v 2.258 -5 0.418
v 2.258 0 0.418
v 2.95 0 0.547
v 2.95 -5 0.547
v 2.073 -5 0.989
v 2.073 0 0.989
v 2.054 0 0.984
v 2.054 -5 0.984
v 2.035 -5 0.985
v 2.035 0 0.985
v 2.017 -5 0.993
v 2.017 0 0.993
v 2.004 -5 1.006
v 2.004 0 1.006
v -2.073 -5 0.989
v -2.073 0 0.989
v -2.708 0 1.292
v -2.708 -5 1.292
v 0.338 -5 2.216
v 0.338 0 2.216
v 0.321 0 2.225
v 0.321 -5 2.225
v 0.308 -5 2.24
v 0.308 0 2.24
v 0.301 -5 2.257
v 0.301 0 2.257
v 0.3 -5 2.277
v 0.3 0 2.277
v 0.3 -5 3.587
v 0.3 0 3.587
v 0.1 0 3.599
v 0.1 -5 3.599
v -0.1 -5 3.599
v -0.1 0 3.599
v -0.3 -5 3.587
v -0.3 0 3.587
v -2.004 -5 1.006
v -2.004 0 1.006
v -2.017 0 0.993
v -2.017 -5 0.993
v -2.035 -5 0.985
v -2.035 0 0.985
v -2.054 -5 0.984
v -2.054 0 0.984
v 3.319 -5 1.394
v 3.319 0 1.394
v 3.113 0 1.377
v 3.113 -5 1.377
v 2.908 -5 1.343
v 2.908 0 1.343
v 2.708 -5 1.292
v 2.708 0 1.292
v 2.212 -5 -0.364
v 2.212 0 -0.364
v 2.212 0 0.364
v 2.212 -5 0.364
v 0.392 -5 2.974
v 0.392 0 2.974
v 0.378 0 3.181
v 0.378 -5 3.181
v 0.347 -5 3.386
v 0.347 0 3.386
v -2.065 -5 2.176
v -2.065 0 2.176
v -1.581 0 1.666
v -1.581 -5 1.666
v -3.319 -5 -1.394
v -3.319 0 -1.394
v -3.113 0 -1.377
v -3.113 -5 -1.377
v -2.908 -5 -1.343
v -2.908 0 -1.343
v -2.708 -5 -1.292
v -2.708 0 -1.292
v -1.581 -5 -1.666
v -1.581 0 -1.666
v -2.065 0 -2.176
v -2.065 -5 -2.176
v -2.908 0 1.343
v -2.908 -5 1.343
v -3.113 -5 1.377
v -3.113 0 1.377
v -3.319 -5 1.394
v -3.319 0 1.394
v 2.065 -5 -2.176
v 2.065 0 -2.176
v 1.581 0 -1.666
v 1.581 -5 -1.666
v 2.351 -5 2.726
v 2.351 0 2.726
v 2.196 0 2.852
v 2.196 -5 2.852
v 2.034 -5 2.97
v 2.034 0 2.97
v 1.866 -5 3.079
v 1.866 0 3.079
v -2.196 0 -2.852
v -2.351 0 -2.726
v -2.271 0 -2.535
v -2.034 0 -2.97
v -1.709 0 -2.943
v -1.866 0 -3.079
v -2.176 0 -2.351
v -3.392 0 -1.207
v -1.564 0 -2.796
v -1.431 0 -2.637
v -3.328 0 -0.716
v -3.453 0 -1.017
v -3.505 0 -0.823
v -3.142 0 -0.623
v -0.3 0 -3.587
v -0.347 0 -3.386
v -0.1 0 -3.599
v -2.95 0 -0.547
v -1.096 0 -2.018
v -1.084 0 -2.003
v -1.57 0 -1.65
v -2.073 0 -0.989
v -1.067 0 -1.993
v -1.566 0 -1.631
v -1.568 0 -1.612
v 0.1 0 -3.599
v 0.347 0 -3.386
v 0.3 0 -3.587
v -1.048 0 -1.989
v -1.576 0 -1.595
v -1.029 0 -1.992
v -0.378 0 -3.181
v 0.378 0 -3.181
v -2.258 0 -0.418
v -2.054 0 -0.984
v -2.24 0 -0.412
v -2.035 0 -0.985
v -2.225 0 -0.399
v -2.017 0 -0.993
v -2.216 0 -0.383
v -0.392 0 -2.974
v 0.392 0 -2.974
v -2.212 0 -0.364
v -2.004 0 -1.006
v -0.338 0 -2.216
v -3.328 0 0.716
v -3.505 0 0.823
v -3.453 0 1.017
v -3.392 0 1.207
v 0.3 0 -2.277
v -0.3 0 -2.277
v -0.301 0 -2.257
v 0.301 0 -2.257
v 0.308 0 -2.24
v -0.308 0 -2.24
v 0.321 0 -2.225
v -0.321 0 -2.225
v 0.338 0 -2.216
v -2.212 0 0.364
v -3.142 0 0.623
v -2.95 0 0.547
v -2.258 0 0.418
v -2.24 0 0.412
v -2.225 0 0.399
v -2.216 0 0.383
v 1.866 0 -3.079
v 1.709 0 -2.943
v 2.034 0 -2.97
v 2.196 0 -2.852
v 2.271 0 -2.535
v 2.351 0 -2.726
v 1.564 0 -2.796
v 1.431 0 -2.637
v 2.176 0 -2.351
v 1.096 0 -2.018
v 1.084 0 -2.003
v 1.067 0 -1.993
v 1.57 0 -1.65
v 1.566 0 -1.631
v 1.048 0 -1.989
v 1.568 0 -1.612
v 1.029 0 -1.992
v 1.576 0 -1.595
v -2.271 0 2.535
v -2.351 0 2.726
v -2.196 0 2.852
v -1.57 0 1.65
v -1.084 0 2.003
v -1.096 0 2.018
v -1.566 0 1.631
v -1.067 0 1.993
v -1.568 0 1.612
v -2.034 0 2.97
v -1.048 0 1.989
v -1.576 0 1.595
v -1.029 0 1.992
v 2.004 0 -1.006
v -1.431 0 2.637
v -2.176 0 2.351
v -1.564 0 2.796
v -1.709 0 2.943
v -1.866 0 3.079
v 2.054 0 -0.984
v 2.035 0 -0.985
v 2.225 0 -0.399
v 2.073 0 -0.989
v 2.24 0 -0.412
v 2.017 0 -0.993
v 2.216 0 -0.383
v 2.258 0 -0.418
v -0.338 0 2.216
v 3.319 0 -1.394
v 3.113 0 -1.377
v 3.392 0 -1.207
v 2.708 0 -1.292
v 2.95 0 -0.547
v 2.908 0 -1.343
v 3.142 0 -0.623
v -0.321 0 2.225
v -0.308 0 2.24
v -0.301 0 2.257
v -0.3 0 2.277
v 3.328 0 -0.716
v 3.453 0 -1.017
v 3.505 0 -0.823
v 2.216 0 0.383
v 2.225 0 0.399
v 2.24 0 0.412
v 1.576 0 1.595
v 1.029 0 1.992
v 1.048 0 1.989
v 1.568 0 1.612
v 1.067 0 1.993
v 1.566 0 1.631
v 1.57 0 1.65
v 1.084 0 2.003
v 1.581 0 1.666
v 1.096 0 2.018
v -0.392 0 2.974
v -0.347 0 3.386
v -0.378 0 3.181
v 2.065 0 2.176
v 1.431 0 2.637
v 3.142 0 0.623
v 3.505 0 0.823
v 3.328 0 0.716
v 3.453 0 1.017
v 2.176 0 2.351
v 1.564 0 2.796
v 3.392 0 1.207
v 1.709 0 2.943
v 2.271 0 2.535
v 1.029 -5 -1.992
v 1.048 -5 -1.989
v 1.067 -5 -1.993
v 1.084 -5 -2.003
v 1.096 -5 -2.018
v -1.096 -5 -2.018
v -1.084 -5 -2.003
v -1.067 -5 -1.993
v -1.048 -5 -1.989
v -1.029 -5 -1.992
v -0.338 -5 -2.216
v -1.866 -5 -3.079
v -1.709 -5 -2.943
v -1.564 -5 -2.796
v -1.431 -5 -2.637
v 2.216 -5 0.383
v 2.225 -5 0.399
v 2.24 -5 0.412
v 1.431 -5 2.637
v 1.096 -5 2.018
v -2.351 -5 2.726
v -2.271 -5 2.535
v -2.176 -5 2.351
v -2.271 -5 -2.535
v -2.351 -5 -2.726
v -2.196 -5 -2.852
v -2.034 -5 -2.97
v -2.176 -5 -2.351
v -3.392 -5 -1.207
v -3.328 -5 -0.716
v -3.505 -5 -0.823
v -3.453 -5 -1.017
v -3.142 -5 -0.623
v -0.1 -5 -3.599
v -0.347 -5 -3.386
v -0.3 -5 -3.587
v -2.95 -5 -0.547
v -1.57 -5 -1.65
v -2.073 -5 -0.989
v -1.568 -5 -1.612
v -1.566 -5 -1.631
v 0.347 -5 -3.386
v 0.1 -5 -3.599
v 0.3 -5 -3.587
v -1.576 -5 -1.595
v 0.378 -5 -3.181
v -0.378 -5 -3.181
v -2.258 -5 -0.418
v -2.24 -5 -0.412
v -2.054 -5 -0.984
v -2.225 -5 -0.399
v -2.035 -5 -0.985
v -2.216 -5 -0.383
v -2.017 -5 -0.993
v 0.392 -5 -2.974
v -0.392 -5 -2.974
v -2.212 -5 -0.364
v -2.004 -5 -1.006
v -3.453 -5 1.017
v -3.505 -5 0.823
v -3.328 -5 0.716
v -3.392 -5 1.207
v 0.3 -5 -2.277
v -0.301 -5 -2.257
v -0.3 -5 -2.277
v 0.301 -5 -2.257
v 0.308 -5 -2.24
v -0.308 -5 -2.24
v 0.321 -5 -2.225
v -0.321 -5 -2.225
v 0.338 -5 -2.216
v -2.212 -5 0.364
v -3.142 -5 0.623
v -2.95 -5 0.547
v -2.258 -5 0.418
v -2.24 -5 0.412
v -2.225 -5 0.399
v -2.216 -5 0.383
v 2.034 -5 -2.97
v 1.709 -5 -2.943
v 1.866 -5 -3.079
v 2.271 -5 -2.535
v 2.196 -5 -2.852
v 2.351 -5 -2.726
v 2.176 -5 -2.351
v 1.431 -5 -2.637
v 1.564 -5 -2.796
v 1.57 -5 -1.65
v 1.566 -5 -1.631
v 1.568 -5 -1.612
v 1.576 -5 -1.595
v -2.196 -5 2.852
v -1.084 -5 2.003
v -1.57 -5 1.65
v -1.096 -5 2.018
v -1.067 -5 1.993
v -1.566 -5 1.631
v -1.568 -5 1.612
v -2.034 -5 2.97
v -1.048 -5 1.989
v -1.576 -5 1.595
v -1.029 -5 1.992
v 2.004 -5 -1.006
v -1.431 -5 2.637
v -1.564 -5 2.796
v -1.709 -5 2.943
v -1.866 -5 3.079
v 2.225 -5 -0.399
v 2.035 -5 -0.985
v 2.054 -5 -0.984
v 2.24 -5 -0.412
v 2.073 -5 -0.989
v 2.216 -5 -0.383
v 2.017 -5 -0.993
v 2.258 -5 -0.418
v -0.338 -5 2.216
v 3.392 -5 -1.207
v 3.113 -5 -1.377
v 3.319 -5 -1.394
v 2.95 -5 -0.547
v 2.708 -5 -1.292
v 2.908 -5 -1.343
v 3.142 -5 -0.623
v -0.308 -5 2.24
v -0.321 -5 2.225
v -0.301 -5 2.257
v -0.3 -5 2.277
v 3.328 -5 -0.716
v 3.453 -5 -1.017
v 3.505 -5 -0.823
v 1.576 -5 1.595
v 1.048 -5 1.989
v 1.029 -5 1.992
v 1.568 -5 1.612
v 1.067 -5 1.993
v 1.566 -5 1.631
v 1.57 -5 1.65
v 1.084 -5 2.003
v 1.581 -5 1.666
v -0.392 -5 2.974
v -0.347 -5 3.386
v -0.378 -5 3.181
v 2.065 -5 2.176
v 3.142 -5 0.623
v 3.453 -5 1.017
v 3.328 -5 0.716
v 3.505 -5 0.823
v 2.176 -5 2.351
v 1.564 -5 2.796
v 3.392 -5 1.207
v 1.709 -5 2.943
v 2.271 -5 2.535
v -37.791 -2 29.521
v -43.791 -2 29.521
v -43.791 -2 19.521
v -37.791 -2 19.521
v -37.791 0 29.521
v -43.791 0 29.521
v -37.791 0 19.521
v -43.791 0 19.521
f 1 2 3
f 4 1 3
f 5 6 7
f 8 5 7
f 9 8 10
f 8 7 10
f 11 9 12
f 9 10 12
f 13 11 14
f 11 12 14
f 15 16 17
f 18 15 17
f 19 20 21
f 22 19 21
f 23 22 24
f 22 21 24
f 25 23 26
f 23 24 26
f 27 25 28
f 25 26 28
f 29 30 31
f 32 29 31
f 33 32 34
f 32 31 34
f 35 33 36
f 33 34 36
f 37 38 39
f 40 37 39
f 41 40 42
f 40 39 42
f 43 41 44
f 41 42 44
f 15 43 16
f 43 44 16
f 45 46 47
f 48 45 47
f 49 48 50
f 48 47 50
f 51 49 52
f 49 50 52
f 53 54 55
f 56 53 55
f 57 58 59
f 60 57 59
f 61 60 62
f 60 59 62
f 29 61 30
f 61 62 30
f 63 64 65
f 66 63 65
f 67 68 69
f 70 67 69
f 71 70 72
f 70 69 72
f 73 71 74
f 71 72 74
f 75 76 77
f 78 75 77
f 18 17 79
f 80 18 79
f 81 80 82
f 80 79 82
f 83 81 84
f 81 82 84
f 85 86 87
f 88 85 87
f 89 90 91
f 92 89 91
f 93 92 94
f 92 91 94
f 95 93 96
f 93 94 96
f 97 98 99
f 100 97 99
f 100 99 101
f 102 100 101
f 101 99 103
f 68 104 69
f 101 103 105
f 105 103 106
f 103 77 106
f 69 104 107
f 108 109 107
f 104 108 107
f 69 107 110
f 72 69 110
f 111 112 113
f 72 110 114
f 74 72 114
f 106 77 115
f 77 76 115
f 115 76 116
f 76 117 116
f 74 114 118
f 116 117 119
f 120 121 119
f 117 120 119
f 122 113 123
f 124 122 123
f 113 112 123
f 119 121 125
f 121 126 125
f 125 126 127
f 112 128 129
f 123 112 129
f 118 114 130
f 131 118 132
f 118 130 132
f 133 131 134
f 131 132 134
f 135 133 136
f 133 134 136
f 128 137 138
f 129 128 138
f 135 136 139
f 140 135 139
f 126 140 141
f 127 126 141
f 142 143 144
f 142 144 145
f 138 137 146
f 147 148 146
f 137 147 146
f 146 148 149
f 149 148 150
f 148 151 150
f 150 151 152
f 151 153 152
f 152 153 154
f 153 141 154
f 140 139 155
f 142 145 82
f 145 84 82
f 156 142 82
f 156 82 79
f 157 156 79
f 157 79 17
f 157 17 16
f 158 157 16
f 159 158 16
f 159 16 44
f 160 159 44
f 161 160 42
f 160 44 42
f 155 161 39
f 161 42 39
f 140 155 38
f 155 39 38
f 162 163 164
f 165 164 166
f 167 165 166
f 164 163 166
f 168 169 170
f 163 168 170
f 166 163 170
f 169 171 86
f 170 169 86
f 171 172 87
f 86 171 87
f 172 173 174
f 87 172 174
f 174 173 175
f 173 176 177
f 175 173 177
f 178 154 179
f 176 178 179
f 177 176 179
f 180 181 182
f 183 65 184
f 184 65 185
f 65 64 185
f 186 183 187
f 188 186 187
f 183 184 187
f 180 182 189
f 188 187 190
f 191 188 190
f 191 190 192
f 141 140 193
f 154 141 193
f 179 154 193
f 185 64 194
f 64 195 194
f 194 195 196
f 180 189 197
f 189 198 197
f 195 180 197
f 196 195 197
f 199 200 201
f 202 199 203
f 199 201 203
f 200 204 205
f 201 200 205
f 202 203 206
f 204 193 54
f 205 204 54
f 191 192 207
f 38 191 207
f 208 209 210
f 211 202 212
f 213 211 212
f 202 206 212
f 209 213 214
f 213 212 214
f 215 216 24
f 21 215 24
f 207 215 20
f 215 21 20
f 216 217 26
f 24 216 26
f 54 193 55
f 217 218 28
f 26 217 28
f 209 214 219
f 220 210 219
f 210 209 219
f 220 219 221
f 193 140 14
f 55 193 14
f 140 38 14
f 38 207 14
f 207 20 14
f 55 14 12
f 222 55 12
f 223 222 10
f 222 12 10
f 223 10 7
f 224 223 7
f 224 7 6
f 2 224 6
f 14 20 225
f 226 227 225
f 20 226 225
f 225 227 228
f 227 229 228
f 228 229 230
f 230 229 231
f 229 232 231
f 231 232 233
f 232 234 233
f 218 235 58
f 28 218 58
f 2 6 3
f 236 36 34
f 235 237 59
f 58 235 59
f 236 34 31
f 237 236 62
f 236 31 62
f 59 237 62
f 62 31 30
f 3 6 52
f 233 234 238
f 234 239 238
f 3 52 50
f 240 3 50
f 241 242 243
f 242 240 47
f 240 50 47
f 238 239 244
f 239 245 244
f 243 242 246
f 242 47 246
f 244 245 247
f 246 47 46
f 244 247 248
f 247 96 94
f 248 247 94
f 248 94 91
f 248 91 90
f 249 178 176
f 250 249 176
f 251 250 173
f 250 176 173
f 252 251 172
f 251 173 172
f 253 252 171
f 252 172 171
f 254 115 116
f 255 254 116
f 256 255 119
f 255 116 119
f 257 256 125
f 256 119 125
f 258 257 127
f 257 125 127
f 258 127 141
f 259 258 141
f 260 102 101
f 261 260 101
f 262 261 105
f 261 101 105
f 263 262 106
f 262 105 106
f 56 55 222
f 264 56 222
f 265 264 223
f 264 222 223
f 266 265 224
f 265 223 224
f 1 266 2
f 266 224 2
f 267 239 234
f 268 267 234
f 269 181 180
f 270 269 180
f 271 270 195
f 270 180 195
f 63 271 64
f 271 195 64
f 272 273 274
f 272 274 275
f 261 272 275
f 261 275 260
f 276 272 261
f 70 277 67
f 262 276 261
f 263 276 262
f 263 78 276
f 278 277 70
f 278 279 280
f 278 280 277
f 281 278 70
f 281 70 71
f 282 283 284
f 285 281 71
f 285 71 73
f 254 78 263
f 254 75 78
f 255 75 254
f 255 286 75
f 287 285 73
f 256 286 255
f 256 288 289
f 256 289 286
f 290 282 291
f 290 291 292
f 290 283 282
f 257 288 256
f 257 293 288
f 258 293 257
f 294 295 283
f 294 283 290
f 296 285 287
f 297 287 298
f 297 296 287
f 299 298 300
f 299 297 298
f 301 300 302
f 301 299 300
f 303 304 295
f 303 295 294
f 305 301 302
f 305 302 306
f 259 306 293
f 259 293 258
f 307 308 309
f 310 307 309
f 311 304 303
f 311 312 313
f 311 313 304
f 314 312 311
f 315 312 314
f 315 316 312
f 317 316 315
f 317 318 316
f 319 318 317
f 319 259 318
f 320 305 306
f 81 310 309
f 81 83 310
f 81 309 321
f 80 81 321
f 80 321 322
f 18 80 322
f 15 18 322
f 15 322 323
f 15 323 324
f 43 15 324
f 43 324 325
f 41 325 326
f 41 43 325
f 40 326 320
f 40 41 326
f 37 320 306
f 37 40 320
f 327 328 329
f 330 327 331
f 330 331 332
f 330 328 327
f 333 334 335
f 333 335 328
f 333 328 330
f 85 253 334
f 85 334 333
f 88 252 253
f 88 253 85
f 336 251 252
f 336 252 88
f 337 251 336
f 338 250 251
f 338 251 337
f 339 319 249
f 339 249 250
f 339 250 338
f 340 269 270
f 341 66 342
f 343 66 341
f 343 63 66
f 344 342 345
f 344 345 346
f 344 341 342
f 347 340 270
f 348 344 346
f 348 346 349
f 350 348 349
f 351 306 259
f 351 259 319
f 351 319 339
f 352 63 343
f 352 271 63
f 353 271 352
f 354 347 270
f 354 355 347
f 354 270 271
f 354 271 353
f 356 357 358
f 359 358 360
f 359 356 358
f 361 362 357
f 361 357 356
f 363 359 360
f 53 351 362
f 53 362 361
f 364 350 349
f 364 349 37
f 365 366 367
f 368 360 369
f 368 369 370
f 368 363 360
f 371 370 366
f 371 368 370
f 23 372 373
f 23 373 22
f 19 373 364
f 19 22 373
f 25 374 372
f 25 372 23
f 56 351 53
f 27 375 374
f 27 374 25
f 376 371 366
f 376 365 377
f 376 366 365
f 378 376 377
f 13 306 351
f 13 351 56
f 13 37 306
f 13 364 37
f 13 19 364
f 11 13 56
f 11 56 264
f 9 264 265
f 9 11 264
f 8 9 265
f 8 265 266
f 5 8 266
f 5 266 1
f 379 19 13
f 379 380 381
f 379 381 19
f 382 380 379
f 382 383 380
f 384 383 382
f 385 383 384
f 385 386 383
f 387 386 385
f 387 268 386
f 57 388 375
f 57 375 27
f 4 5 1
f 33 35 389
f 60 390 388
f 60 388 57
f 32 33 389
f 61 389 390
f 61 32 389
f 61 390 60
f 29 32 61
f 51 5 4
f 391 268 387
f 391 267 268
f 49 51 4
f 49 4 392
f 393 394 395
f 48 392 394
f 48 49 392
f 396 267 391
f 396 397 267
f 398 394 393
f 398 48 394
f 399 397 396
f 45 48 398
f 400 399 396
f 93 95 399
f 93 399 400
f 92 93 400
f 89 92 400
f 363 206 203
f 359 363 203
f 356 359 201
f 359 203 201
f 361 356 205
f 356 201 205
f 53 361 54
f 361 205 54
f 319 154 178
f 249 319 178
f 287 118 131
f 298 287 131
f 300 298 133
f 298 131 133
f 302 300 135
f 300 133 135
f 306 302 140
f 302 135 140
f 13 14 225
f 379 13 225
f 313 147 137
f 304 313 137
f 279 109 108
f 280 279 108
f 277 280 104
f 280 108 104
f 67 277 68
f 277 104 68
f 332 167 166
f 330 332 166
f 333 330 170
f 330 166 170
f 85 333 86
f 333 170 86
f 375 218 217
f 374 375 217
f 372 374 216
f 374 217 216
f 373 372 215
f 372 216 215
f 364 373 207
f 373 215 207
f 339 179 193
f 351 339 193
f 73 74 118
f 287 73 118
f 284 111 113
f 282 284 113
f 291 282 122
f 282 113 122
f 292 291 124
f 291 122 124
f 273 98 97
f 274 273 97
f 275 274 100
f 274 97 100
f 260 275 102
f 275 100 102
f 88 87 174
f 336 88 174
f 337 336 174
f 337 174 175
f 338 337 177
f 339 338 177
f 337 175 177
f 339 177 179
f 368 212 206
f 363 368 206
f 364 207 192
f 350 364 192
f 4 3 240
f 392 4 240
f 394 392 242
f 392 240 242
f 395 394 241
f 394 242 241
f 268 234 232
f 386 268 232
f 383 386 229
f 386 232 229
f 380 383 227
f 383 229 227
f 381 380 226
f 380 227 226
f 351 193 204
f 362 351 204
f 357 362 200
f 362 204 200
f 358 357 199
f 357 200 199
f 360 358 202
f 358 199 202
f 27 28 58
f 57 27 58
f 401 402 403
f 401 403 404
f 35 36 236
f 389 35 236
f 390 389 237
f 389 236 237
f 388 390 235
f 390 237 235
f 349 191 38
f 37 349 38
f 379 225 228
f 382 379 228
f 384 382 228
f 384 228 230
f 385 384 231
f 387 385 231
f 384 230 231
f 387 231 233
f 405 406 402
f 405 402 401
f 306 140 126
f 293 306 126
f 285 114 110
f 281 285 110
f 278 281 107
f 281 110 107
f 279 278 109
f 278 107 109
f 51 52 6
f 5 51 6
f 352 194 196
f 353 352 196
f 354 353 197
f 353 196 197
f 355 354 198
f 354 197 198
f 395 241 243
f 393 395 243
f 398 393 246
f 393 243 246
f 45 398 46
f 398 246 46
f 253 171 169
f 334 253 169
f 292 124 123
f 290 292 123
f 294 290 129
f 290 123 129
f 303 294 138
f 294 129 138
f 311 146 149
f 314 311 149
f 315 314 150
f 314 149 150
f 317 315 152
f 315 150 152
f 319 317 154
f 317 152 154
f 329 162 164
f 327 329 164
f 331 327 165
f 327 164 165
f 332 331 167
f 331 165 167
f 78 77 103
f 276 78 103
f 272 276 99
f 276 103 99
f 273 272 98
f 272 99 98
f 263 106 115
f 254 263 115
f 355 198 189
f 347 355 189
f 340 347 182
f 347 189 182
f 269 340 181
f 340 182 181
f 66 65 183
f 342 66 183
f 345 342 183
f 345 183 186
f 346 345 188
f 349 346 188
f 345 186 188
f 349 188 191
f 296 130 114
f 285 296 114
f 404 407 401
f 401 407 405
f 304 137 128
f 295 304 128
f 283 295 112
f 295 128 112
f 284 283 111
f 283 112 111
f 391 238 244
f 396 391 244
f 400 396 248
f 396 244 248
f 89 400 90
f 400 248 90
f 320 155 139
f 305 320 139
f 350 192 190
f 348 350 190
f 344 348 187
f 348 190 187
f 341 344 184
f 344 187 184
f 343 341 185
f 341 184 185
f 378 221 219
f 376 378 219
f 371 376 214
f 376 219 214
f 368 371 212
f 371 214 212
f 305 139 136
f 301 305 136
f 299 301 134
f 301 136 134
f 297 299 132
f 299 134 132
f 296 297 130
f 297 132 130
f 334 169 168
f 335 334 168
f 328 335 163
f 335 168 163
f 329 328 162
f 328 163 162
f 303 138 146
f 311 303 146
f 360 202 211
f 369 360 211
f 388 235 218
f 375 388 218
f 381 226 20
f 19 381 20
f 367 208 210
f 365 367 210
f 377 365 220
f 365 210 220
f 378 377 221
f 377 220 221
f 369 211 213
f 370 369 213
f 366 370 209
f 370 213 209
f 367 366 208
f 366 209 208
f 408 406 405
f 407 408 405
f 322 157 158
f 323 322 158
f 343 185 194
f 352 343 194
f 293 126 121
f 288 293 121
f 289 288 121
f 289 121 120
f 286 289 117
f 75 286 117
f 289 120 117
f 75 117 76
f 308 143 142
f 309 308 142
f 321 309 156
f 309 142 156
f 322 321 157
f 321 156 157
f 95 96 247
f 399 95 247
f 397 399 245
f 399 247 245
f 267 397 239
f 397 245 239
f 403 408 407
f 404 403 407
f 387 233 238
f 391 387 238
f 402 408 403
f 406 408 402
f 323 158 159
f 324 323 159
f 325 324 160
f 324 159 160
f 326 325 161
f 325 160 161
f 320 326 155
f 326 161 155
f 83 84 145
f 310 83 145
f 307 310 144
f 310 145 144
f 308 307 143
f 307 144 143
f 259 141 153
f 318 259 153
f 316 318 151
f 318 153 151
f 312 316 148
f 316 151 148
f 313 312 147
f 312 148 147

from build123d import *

# Parameters (mm, degrees)
F1_DEPTH = 5
F2_W     = 6
F2_H     = 10
F3_DEPTH = 2


with BuildPart() as f1:
    # F0 (on Front) → F1 (new body)
    with BuildSketch(Plane.XZ):
        with BuildLine():
            ThreePointArc((0.391763, 2.97431), (0.364898, 3.28374), (0.3, 3.587478))
            ThreePointArc((0.3, 3.587478), (0, 3.6), (-0.3, 3.587478))
            ThreePointArc((-0.3, 3.587478), (-0.364898, 3.28374), (-0.391763, 2.97431))
            Line((-0.391763, 2.97431), (-0.299872, 2.276662))
            ThreePointArc((-0.299872, 2.276662), (-0.307986, 2.239669), (-0.337881, 2.216417))
            Line((-0.337881, 2.216417), (-1.029426, 1.991721))
            ThreePointArc((-1.029426, 1.991721), (-1.067278, 1.99296), (-1.095587, 2.018119))
            Line((-1.095587, 2.018119), (-1.431313, 2.63654))
            ThreePointArc((-1.431313, 2.63654), (-1.634926, 2.871083), (-1.865962, 3.078666))
            ThreePointArc((-1.865962, 3.078666), (-2.116027, 2.912461), (-2.351372, 2.725995))
            ThreePointArc((-2.351372, 2.725995), (-2.225342, 2.44212), (-2.065198, 2.175995))
            Line((-2.065198, 2.175995), (-1.58079, 1.665598))
            ThreePointArc((-1.58079, 1.665598), (-1.565611, 1.630901), (-1.576129, 1.594518))
            Line((-1.576129, 1.594518), (-2.003527, 1.006254))
            ThreePointArc((-2.003527, 1.006254), (-2.034879, 0.985008), (-2.072569, 0.988722))
            Line((-2.072569, 0.988722), (-2.707676, 1.291701))
            ThreePointArc((-2.707676, 1.291701), (-3.010263, 1.36177), (-3.319189, 1.393909))
            ThreePointArc((-3.319189, 1.393909), (-3.423803, 1.112461), (-3.5046, 0.823275))
            ThreePointArc((-3.5046, 0.823275), (-3.235782, 0.667693), (-2.949799, 0.546524))
            Line((-2.949799, 0.546524), (-2.2579, 0.418332))
            ThreePointArc((-2.2579, 0.418332), (-2.225225, 0.399183), (-2.212349, 0.363567))
            Line((-2.212349, 0.363567), (-2.212349, -0.363567))
            ThreePointArc((-2.212349, -0.363567), (-2.225225, -0.399183), (-2.2579, -0.418332))
            Line((-2.2579, -0.418332), (-2.949799, -0.546524))
            ThreePointArc((-2.949799, -0.546524), (-3.235782, -0.667693), (-3.5046, -0.823275))
            ThreePointArc((-3.5046, -0.823275), (-3.423803, -1.112461), (-3.319189, -1.393909))
            ThreePointArc((-3.319189, -1.393909), (-3.010263, -1.36177), (-2.707676, -1.291701))
            Line((-2.707676, -1.291701), (-2.072569, -0.988722))
            ThreePointArc((-2.072569, -0.988722), (-2.034879, -0.985008), (-2.003527, -1.006254))
            Line((-2.003527, -1.006254), (-1.576129, -1.594518))
            ThreePointArc((-1.576129, -1.594518), (-1.565611, -1.630901), (-1.58079, -1.665598))
            Line((-1.58079, -1.665598), (-2.065198, -2.175995))
            ThreePointArc((-2.065198, -2.175995), (-2.225342, -2.44212), (-2.351372, -2.725995))
            ThreePointArc((-2.351372, -2.725995), (-2.116027, -2.912461), (-1.865962, -3.078666))
            ThreePointArc((-1.865962, -3.078666), (-1.634926, -2.871083), (-1.431313, -2.63654))
            Line((-1.431313, -2.63654), (-1.095587, -2.018119))
            ThreePointArc((-1.095587, -2.018119), (-1.067278, -1.99296), (-1.029426, -1.991721))
            Line((-1.029426, -1.991721), (-0.337881, -2.216417))
            ThreePointArc((-0.337881, -2.216417), (-0.307986, -2.239669), (-0.299872, -2.276662))
            Line((-0.299872, -2.276662), (-0.391763, -2.97431))
            ThreePointArc((-0.391763, -2.97431), (-0.364898, -3.28374), (-0.3, -3.587478))
            ThreePointArc((-0.3, -3.587478), (0, -3.6), (0.3, -3.587478))
            ThreePointArc((0.3, -3.587478), (0.364898, -3.28374), (0.391763, -2.97431))
            Line((0.391763, -2.97431), (0.299872, -2.276662))
            ThreePointArc((0.299872, -2.276662), (0.307986, -2.239669), (0.337881, -2.216417))
            Line((0.337881, -2.216417), (1.029426, -1.991721))
            ThreePointArc((1.029426, -1.991721), (1.067278, -1.99296), (1.095587, -2.018119))
            Line((1.095587, -2.018119), (1.431313, -2.63654))
            ThreePointArc((1.431313, -2.63654), (1.634926, -2.871083), (1.865962, -3.078666))
            ThreePointArc((1.865962, -3.078666), (2.116027, -2.912461), (2.351372, -2.725995))
            ThreePointArc((2.351372, -2.725995), (2.225342, -2.44212), (2.065198, -2.175995))
            Line((2.065198, -2.175995), (1.58079, -1.665598))
            ThreePointArc((1.58079, -1.665598), (1.565611, -1.630901), (1.576129, -1.594518))
            Line((1.576129, -1.594518), (2.003527, -1.006254))
            ThreePointArc((2.003527, -1.006254), (2.034879, -0.985008), (2.072569, -0.988722))
            Line((2.072569, -0.988722), (2.707676, -1.291701))
            ThreePointArc((2.707676, -1.291701), (3.010263, -1.36177), (3.319189, -1.393909))
            ThreePointArc((3.319189, -1.393909), (3.423803, -1.112461), (3.5046, -0.823275))
            ThreePointArc((3.5046, -0.823275), (3.235782, -0.667693), (2.949799, -0.546524))
            Line((2.949799, -0.546524), (2.2579, -0.418332))
            ThreePointArc((2.2579, -0.418332), (2.225225, -0.399183), (2.212349, -0.363567))
            Line((2.212349, -0.363567), (2.212349, 0.363567))
            ThreePointArc((2.212349, 0.363567), (2.225225, 0.399183), (2.2579, 0.418332))
            Line((2.2579, 0.418332), (2.949799, 0.546524))
            ThreePointArc((2.949799, 0.546524), (3.235782, 0.667693), (3.5046, 0.823275))
            ThreePointArc((3.5046, 0.823275), (3.423803, 1.112461), (3.319189, 1.393909))
            ThreePointArc((3.319189, 1.393909), (3.010263, 1.36177), (2.707676, 1.291701))
            Line((2.707676, 1.291701), (2.072569, 0.988722))
            ThreePointArc((2.072569, 0.988722), (2.034879, 0.985008), (2.003527, 1.006254))
            Line((2.003527, 1.006254), (1.576129, 1.594518))
            ThreePointArc((1.576129, 1.594518), (1.565611, 1.630901), (1.58079, 1.665598))
            Line((1.58079, 1.665598), (2.065198, 2.175995))
            ThreePointArc((2.065198, 2.175995), (2.225342, 2.44212), (2.351372, 2.725995))
            ThreePointArc((2.351372, 2.725995), (2.116027, 2.912461), (1.865962, 3.078666))
            ThreePointArc((1.865962, 3.078666), (1.634926, 2.871083), (1.431313, 2.63654))
            Line((1.431313, 2.63654), (1.095587, 2.018119))
            ThreePointArc((1.095587, 2.018119), (1.067278, 1.99296), (1.029426, 1.991721))
            Line((1.029426, 1.991721), (0.337881, 2.216417))
            ThreePointArc((0.337881, 2.216417), (0.307986, 2.239669), (0.299872, 2.276662))
            Line((0.299872, 2.276662), (0.391763, 2.97431))
        make_face()
    extrude(amount=F1_DEPTH)


with BuildPart() as f3:
    # F2 (on Front) → F3 (new body)
    with BuildSketch(Plane.XZ):
        with Locations((-40.790888, 24.521398)):
            Rectangle(F2_W, F2_H)
    extrude(amount=F3_DEPTH)


solid = Compound([f1.part, f3.part])
